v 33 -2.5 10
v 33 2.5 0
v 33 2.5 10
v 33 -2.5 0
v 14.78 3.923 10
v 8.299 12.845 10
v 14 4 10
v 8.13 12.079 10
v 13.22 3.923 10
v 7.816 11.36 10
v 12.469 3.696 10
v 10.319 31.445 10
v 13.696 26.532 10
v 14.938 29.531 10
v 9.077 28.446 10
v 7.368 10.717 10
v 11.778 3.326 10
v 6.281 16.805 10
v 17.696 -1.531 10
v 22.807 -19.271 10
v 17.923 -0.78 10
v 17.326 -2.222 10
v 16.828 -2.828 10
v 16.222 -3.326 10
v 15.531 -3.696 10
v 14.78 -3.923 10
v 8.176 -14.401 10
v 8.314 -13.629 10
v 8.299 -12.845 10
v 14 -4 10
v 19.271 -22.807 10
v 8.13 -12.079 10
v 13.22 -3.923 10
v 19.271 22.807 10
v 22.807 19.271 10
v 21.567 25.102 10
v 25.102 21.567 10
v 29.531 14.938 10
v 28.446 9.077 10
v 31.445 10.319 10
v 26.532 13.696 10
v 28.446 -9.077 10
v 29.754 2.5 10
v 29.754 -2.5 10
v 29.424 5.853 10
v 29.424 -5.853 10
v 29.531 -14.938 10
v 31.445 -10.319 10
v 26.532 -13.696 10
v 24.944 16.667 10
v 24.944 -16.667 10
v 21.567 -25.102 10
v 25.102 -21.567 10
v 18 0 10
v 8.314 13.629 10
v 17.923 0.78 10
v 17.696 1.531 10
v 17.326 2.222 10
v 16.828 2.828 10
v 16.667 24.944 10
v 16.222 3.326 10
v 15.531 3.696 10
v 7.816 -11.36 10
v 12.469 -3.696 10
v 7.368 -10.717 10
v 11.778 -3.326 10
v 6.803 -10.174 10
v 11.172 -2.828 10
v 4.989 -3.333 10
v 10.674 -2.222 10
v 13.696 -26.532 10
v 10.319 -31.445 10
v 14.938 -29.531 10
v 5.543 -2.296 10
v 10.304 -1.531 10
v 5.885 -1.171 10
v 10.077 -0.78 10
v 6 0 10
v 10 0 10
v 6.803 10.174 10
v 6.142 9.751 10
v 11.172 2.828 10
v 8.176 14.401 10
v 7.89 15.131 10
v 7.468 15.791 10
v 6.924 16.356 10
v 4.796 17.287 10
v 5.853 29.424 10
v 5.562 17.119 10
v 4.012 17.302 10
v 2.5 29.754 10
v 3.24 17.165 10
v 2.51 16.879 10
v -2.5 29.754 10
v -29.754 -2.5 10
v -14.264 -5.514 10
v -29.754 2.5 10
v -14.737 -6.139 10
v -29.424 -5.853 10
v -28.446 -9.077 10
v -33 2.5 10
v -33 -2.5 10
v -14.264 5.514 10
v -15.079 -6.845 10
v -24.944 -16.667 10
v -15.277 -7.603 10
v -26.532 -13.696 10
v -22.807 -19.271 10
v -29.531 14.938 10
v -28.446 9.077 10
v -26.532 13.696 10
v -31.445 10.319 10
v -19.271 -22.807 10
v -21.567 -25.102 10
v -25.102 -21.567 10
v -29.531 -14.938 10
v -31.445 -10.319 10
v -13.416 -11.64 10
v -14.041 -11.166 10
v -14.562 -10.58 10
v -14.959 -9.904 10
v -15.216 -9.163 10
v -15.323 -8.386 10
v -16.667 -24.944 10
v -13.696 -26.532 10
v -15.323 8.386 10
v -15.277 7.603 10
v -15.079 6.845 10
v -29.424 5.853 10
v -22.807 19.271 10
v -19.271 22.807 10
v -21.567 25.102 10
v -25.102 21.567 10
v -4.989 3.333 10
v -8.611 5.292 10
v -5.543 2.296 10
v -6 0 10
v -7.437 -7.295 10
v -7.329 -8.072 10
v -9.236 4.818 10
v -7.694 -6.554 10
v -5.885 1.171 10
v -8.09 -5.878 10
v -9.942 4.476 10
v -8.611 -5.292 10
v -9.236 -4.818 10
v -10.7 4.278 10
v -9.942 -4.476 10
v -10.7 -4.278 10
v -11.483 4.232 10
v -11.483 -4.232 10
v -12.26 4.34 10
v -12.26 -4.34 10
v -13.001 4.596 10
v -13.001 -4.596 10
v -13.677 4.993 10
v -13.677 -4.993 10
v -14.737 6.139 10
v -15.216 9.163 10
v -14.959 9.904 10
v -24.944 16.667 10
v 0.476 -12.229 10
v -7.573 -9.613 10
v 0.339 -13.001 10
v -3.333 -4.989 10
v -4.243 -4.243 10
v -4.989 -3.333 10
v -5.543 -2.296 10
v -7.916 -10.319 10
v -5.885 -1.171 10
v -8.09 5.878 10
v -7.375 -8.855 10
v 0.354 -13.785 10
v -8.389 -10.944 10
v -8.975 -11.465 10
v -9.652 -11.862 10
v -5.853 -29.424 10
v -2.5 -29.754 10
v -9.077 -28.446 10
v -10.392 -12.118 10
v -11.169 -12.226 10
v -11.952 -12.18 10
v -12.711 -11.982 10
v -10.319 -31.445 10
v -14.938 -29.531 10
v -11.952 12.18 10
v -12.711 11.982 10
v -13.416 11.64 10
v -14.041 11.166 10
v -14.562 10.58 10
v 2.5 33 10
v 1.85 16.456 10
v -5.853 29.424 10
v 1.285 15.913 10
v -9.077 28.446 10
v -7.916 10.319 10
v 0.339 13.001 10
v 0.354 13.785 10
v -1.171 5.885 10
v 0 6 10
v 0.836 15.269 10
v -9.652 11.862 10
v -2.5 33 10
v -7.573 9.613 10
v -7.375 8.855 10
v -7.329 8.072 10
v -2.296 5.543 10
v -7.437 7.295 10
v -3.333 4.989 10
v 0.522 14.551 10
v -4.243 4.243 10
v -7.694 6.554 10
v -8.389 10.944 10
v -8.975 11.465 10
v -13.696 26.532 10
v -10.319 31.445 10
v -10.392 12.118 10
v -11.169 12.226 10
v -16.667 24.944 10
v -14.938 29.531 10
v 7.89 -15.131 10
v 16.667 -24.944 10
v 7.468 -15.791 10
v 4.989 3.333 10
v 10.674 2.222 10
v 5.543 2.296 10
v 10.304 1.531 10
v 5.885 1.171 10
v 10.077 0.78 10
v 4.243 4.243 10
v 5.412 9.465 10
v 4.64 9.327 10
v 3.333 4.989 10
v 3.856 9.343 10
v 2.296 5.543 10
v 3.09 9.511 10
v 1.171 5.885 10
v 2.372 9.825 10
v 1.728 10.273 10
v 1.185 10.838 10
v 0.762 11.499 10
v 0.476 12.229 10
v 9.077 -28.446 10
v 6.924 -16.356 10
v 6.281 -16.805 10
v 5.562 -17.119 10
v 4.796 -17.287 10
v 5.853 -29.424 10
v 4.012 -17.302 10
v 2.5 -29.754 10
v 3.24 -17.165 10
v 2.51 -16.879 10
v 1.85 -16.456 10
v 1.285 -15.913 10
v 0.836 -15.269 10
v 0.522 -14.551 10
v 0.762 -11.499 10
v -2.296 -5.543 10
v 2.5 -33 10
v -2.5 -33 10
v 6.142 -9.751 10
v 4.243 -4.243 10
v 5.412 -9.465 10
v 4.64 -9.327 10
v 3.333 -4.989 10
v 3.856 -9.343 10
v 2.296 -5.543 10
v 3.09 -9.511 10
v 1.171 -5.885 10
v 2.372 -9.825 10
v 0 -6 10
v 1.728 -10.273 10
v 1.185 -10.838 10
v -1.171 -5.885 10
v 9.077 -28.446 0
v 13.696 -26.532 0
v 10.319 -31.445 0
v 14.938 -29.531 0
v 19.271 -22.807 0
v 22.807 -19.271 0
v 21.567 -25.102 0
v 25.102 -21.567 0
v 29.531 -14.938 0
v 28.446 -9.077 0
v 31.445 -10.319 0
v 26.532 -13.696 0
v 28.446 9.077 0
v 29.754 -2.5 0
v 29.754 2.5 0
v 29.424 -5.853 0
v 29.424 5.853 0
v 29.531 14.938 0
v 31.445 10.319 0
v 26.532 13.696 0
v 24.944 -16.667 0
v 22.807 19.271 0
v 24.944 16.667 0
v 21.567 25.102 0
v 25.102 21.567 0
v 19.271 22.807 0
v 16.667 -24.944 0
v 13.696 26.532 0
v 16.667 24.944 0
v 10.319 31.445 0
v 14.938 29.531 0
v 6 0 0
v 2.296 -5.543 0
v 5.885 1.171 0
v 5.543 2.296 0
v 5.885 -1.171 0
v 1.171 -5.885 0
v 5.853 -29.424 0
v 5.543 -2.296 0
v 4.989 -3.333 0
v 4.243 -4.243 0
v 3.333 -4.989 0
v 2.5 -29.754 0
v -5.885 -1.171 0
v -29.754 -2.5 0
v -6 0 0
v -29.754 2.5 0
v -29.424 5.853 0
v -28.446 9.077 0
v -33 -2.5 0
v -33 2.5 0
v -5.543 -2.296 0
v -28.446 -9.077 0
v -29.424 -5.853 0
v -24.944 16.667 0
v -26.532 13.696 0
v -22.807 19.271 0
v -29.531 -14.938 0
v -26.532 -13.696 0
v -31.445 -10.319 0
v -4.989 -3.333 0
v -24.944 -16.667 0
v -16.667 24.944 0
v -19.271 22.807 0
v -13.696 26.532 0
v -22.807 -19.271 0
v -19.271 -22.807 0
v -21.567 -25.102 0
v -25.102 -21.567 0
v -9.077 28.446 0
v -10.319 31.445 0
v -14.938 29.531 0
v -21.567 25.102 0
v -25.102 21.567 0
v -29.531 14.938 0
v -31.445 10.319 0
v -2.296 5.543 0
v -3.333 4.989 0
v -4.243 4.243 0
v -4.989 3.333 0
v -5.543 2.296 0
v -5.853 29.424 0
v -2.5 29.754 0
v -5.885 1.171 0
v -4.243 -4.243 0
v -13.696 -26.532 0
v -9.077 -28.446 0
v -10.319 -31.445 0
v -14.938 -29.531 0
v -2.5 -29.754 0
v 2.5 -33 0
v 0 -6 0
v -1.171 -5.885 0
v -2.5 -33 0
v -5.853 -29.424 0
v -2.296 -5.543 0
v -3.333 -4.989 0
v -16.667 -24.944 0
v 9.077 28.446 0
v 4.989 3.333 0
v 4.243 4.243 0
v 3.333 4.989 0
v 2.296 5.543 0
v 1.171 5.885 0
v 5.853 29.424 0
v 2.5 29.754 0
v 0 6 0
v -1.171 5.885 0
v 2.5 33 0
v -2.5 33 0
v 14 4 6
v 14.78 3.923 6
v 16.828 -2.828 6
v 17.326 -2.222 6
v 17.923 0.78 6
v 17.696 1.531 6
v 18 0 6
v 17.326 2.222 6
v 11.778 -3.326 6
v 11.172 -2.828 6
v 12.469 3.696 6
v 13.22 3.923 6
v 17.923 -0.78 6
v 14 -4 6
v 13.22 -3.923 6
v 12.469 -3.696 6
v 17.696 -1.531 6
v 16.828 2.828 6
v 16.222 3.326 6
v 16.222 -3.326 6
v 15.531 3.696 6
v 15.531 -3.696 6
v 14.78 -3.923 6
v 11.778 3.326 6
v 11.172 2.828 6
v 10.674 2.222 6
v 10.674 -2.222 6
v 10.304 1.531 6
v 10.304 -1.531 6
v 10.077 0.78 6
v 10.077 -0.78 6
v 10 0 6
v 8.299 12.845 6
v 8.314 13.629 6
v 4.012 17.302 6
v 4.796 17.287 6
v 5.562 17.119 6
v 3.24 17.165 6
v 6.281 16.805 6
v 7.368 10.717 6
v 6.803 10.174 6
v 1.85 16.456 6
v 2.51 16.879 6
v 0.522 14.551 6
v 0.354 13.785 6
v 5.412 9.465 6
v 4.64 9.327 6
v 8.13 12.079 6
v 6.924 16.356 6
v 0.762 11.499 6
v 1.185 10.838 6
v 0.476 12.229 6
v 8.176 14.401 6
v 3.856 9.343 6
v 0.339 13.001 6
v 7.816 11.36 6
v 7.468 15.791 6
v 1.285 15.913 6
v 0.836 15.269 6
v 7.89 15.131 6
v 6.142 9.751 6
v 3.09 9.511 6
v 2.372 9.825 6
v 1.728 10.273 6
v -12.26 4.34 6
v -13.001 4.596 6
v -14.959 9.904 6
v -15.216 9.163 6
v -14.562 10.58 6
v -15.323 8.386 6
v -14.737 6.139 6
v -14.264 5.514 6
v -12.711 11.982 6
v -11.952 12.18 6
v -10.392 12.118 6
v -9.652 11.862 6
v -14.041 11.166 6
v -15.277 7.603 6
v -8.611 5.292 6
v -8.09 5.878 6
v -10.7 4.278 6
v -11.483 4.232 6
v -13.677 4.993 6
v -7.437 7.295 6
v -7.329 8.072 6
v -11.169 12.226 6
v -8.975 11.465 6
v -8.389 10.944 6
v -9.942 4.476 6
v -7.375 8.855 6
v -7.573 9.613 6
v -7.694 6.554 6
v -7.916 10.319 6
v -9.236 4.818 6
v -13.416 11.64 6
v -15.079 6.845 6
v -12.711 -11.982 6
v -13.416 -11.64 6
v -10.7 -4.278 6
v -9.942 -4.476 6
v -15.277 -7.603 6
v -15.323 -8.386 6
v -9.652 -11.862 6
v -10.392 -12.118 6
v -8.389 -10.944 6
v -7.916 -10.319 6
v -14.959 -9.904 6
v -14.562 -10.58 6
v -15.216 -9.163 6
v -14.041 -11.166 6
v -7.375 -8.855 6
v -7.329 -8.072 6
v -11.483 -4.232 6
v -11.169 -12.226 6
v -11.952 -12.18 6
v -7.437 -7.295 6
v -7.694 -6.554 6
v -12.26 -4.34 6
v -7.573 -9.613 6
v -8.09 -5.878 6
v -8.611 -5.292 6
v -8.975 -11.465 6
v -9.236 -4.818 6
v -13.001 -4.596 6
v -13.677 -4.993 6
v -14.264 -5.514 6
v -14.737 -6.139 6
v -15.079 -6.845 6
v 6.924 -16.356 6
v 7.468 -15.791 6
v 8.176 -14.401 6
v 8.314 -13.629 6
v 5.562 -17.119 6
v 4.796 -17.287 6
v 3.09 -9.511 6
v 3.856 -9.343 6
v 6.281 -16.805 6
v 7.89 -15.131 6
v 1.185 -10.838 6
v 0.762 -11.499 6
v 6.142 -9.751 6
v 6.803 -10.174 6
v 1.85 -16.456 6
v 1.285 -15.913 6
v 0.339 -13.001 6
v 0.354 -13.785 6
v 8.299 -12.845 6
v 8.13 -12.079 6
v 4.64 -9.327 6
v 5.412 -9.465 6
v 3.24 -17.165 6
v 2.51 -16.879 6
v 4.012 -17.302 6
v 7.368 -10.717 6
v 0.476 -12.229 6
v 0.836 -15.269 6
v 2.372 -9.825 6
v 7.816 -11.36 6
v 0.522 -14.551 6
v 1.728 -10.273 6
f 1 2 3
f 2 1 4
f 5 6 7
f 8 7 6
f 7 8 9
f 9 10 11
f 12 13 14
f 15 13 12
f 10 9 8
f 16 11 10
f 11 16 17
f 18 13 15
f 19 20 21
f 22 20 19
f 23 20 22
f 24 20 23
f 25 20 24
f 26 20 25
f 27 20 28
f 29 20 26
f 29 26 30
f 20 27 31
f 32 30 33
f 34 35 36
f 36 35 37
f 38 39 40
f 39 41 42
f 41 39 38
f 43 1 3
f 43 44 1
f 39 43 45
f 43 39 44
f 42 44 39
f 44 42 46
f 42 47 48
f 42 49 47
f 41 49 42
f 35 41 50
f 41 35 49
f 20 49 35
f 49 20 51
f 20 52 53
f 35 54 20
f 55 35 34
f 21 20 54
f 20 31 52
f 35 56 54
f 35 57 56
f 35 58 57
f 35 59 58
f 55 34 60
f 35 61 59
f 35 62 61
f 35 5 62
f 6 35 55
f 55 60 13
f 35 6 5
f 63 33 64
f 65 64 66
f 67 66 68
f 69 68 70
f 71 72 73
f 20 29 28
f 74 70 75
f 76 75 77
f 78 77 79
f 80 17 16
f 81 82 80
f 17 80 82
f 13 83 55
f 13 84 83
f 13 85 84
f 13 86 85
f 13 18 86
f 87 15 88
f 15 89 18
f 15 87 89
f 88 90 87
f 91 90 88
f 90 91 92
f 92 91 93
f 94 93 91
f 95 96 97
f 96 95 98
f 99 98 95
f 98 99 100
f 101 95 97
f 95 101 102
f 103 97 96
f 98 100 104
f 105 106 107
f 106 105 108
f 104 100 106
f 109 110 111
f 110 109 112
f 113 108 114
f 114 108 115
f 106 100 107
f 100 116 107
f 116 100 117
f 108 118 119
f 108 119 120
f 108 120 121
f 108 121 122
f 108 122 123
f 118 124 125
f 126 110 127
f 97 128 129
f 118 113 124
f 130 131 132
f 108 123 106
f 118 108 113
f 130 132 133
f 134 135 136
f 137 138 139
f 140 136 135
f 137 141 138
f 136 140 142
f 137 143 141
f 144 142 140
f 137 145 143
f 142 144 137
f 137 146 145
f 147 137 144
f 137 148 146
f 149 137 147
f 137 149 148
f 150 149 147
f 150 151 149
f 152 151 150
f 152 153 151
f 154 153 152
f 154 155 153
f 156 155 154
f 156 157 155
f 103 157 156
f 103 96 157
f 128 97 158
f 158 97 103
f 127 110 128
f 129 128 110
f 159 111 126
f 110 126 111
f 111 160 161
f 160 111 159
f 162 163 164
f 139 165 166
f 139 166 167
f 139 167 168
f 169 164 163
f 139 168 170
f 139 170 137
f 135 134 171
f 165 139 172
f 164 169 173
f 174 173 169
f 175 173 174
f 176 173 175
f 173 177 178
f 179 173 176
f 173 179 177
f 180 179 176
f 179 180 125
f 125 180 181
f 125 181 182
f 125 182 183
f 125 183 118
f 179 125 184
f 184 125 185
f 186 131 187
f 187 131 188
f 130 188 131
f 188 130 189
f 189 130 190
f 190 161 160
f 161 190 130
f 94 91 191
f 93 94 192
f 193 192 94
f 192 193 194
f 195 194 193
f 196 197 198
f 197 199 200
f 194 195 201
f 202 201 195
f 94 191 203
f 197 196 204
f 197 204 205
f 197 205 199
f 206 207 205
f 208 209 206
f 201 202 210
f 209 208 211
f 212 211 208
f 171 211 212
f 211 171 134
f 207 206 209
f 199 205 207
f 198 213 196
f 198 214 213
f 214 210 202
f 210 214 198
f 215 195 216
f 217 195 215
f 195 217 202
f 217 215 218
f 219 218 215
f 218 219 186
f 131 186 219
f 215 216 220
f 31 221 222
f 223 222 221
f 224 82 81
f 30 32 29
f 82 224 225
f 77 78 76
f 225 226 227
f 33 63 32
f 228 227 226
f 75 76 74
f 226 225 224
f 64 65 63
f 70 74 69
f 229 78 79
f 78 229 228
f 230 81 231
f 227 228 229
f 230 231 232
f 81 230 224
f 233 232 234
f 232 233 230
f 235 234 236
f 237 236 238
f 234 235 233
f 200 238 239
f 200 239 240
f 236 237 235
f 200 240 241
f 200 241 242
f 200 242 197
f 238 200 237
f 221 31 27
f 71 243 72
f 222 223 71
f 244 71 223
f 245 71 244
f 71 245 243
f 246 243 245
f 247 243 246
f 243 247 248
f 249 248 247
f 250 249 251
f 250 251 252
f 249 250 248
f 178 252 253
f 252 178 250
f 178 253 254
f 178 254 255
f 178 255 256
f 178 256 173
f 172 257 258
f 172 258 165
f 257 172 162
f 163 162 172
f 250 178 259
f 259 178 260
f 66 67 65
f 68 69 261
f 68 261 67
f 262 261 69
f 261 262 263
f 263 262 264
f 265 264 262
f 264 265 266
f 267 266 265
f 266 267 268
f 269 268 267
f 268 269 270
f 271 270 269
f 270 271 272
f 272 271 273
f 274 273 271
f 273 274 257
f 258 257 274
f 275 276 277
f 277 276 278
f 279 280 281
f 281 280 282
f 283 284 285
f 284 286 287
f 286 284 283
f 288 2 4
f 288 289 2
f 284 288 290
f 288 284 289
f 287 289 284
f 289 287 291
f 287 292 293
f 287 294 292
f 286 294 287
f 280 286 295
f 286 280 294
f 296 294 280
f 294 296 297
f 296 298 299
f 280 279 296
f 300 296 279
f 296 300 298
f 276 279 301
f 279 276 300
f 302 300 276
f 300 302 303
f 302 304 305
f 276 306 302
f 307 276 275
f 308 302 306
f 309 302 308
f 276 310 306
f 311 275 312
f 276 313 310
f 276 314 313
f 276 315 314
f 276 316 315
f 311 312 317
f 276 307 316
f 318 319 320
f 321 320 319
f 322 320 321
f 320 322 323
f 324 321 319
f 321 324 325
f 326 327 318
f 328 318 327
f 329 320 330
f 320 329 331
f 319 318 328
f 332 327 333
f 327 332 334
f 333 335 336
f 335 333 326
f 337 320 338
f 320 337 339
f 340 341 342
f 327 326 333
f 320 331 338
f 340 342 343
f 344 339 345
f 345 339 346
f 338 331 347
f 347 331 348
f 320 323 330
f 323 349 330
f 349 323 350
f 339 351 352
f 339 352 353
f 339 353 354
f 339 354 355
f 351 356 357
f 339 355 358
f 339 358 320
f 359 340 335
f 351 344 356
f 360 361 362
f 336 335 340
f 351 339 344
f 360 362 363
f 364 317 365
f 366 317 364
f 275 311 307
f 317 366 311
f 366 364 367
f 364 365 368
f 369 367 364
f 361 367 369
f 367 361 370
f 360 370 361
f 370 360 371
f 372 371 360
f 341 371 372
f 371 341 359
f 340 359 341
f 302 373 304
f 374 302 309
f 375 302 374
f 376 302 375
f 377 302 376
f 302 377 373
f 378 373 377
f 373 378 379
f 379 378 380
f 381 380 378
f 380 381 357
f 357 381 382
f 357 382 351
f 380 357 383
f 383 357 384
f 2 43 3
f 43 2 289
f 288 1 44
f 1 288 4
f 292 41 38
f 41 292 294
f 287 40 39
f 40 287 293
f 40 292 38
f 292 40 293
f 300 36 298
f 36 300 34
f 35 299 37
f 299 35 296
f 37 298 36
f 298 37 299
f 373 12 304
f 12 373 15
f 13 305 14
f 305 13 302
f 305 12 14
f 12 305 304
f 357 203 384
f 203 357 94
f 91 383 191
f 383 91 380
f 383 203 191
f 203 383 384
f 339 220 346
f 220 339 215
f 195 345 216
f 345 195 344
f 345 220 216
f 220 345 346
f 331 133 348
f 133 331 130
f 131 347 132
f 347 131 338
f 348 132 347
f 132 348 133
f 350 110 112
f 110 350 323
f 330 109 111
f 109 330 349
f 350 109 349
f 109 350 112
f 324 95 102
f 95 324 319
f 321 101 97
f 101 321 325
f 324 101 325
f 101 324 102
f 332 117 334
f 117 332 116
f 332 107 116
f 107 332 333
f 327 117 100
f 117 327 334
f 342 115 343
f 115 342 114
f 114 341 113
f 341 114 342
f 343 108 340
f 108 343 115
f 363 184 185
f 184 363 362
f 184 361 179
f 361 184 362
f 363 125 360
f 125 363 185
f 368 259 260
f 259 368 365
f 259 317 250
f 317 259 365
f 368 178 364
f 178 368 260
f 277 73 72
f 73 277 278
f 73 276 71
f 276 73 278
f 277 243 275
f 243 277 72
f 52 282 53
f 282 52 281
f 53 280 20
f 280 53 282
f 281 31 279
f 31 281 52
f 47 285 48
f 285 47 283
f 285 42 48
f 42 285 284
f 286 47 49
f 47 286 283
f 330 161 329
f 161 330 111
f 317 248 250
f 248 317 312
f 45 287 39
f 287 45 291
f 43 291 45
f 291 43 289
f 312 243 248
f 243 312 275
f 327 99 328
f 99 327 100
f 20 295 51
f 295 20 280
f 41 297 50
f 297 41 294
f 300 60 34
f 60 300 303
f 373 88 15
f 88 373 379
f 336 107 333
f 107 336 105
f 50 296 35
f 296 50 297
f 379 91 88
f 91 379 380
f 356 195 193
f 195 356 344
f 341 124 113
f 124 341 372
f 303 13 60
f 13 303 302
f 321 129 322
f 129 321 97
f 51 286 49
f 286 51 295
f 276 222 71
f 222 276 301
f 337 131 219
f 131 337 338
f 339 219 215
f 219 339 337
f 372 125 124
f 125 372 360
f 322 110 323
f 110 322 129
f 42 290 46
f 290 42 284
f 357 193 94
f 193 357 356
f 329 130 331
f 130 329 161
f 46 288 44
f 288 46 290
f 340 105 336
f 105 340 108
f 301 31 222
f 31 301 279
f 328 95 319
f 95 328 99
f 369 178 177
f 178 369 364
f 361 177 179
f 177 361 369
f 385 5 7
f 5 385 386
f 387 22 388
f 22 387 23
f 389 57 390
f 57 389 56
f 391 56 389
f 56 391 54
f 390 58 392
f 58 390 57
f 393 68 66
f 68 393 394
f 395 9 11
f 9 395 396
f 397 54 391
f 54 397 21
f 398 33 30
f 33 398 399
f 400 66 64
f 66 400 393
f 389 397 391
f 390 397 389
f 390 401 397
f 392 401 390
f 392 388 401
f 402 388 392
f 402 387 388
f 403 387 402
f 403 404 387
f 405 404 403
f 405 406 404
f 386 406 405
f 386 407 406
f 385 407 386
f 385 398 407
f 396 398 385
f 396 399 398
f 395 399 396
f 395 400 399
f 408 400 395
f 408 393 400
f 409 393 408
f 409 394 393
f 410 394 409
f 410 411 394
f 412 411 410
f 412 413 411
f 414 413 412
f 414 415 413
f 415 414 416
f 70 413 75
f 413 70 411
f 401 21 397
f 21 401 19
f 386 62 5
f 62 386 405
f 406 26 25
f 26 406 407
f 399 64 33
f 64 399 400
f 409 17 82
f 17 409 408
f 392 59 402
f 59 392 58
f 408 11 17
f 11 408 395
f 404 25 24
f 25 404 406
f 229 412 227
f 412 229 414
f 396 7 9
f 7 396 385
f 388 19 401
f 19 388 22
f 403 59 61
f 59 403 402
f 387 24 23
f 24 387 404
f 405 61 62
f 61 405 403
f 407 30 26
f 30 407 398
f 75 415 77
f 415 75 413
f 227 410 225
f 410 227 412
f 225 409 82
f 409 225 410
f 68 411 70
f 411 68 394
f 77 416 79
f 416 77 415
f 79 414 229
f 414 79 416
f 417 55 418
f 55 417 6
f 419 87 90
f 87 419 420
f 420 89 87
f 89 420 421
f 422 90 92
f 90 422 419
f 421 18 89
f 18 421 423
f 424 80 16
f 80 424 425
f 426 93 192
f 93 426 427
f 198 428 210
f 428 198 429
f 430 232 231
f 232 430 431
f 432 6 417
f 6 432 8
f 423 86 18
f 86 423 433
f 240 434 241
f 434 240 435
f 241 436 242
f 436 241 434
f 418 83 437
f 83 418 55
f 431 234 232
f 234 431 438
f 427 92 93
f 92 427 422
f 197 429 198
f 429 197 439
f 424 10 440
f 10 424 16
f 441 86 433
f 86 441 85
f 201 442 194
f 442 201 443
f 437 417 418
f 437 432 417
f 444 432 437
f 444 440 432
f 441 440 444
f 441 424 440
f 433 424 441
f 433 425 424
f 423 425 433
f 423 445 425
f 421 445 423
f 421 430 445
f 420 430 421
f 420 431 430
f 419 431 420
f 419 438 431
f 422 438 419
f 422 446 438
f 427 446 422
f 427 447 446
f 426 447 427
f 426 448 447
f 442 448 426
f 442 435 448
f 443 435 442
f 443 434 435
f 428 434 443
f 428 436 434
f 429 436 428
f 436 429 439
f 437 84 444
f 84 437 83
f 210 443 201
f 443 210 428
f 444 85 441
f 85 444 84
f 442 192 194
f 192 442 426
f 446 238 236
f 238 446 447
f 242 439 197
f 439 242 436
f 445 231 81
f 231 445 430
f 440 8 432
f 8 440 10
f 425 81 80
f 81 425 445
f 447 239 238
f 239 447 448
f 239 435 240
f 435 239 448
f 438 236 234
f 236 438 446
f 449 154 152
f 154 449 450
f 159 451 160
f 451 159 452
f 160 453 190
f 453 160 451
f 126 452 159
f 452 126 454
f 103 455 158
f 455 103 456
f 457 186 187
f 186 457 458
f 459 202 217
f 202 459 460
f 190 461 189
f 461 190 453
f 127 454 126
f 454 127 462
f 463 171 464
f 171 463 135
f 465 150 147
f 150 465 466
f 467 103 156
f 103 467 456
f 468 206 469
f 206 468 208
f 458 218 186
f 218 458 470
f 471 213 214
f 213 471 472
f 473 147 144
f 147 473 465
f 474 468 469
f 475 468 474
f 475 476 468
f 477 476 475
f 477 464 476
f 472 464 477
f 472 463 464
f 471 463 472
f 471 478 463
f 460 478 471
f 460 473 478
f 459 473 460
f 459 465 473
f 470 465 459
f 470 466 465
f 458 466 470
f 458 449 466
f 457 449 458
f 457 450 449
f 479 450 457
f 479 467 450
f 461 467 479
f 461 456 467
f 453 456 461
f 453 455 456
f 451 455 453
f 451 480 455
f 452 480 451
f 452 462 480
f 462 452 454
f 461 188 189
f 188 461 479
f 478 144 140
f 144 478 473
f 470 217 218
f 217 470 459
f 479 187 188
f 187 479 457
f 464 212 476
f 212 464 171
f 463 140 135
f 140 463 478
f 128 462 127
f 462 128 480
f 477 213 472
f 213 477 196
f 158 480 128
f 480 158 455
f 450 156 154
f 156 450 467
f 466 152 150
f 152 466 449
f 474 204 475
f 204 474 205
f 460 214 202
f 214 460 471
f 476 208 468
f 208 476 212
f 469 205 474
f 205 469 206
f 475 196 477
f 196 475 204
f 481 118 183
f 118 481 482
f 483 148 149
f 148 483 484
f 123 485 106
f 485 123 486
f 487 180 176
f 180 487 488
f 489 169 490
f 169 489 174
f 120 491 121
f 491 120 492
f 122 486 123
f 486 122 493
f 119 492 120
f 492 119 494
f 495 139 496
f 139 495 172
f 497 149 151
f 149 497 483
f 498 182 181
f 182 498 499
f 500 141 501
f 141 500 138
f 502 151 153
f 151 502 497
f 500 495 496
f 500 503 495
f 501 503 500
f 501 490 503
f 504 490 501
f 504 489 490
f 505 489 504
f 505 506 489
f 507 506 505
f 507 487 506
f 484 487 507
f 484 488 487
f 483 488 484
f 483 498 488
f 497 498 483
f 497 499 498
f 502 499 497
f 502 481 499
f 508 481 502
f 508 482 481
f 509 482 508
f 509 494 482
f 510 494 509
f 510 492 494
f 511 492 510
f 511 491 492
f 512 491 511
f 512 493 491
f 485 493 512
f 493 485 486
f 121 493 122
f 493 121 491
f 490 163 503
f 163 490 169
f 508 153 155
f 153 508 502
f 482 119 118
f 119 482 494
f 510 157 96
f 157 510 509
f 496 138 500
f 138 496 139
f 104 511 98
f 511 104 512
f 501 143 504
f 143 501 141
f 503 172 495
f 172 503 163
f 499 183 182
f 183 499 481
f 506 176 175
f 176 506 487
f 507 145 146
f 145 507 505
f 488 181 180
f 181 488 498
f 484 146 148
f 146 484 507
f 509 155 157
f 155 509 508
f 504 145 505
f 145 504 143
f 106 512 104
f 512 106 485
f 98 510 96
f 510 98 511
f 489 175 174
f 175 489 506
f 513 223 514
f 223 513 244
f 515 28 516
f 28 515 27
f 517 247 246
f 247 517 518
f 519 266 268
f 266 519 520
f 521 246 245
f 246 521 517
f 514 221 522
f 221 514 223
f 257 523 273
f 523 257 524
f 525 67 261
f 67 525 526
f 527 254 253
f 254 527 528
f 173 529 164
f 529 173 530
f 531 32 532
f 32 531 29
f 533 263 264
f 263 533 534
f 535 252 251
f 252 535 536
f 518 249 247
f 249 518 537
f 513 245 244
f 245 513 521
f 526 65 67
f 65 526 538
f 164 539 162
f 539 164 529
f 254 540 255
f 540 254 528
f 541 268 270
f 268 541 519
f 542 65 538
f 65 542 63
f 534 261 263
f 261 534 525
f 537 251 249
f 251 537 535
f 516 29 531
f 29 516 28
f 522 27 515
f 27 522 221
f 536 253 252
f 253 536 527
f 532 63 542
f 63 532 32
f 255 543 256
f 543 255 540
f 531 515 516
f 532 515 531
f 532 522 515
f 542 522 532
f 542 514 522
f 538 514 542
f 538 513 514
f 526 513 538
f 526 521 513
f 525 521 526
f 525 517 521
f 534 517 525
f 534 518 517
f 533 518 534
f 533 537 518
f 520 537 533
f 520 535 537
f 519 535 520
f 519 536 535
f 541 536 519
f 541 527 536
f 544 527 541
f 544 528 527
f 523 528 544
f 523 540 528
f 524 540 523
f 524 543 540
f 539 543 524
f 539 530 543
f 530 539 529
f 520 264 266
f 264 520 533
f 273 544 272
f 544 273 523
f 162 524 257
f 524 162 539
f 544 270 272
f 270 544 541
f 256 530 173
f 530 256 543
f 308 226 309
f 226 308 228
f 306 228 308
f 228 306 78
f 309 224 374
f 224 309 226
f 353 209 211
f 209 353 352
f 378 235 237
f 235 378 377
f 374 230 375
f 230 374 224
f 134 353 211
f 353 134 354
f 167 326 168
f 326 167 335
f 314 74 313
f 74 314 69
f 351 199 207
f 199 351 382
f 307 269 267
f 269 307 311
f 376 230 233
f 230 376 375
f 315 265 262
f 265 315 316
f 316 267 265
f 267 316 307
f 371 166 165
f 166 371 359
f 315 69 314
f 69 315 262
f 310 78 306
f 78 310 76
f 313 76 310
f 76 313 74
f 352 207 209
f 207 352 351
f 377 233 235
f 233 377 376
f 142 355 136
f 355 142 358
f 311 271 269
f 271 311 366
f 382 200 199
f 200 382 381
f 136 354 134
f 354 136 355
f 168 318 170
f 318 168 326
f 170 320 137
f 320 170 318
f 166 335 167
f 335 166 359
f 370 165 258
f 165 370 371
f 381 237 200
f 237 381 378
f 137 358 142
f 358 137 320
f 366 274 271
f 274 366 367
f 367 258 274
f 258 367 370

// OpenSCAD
$fn = 32;

// ----------------------------------------------------------------------
// Spur blank: lightened gear blank
// ----------------------------------------------------------------------

// --- parameters (mm) ---
disc_r = 30;              // blank root radius
disc_t = 10;              // blank thickness
n_teeth = 16;             // stub tooth count
tooth_w = 5;              // tooth width at the root
tooth_h = 3;              // tooth height above the root
bore_r = 6;               // central bore radius
ring_r = 14;              // lightening pocket ring radius
pocket_r = 4;             // lightening pocket radius
fit_tol = 0.1;            // tolerance for press fits, mm
free_tol = 0.3;           // tolerance for clearance fits, mm

out_r = disc_r + tooth_h;  // tip radius
bbox_x = 66.0;  // measured width over the teeth
bbox_y = 66.0;  // measured depth over the teeth

difference() {
union() {
  cylinder(r = disc_r, h = disc_t);
  for (i = [0 : n_teeth - 1])
    rotate([0, 0, i * 360 / n_teeth])
      translate([disc_r - 1, -tooth_w / 2, 0])
        cube([tooth_h + 1, tooth_w, disc_t]);
}
  translate([0, 0, -1]) cylinder(r = bore_r, h = disc_t + 2);
  for (i = [0 : 5])
    rotate([0, 0, i * 72])
      translate([ring_r, 0, disc_t - 4])
        cylinder(r = pocket_r, h = 5);
}
